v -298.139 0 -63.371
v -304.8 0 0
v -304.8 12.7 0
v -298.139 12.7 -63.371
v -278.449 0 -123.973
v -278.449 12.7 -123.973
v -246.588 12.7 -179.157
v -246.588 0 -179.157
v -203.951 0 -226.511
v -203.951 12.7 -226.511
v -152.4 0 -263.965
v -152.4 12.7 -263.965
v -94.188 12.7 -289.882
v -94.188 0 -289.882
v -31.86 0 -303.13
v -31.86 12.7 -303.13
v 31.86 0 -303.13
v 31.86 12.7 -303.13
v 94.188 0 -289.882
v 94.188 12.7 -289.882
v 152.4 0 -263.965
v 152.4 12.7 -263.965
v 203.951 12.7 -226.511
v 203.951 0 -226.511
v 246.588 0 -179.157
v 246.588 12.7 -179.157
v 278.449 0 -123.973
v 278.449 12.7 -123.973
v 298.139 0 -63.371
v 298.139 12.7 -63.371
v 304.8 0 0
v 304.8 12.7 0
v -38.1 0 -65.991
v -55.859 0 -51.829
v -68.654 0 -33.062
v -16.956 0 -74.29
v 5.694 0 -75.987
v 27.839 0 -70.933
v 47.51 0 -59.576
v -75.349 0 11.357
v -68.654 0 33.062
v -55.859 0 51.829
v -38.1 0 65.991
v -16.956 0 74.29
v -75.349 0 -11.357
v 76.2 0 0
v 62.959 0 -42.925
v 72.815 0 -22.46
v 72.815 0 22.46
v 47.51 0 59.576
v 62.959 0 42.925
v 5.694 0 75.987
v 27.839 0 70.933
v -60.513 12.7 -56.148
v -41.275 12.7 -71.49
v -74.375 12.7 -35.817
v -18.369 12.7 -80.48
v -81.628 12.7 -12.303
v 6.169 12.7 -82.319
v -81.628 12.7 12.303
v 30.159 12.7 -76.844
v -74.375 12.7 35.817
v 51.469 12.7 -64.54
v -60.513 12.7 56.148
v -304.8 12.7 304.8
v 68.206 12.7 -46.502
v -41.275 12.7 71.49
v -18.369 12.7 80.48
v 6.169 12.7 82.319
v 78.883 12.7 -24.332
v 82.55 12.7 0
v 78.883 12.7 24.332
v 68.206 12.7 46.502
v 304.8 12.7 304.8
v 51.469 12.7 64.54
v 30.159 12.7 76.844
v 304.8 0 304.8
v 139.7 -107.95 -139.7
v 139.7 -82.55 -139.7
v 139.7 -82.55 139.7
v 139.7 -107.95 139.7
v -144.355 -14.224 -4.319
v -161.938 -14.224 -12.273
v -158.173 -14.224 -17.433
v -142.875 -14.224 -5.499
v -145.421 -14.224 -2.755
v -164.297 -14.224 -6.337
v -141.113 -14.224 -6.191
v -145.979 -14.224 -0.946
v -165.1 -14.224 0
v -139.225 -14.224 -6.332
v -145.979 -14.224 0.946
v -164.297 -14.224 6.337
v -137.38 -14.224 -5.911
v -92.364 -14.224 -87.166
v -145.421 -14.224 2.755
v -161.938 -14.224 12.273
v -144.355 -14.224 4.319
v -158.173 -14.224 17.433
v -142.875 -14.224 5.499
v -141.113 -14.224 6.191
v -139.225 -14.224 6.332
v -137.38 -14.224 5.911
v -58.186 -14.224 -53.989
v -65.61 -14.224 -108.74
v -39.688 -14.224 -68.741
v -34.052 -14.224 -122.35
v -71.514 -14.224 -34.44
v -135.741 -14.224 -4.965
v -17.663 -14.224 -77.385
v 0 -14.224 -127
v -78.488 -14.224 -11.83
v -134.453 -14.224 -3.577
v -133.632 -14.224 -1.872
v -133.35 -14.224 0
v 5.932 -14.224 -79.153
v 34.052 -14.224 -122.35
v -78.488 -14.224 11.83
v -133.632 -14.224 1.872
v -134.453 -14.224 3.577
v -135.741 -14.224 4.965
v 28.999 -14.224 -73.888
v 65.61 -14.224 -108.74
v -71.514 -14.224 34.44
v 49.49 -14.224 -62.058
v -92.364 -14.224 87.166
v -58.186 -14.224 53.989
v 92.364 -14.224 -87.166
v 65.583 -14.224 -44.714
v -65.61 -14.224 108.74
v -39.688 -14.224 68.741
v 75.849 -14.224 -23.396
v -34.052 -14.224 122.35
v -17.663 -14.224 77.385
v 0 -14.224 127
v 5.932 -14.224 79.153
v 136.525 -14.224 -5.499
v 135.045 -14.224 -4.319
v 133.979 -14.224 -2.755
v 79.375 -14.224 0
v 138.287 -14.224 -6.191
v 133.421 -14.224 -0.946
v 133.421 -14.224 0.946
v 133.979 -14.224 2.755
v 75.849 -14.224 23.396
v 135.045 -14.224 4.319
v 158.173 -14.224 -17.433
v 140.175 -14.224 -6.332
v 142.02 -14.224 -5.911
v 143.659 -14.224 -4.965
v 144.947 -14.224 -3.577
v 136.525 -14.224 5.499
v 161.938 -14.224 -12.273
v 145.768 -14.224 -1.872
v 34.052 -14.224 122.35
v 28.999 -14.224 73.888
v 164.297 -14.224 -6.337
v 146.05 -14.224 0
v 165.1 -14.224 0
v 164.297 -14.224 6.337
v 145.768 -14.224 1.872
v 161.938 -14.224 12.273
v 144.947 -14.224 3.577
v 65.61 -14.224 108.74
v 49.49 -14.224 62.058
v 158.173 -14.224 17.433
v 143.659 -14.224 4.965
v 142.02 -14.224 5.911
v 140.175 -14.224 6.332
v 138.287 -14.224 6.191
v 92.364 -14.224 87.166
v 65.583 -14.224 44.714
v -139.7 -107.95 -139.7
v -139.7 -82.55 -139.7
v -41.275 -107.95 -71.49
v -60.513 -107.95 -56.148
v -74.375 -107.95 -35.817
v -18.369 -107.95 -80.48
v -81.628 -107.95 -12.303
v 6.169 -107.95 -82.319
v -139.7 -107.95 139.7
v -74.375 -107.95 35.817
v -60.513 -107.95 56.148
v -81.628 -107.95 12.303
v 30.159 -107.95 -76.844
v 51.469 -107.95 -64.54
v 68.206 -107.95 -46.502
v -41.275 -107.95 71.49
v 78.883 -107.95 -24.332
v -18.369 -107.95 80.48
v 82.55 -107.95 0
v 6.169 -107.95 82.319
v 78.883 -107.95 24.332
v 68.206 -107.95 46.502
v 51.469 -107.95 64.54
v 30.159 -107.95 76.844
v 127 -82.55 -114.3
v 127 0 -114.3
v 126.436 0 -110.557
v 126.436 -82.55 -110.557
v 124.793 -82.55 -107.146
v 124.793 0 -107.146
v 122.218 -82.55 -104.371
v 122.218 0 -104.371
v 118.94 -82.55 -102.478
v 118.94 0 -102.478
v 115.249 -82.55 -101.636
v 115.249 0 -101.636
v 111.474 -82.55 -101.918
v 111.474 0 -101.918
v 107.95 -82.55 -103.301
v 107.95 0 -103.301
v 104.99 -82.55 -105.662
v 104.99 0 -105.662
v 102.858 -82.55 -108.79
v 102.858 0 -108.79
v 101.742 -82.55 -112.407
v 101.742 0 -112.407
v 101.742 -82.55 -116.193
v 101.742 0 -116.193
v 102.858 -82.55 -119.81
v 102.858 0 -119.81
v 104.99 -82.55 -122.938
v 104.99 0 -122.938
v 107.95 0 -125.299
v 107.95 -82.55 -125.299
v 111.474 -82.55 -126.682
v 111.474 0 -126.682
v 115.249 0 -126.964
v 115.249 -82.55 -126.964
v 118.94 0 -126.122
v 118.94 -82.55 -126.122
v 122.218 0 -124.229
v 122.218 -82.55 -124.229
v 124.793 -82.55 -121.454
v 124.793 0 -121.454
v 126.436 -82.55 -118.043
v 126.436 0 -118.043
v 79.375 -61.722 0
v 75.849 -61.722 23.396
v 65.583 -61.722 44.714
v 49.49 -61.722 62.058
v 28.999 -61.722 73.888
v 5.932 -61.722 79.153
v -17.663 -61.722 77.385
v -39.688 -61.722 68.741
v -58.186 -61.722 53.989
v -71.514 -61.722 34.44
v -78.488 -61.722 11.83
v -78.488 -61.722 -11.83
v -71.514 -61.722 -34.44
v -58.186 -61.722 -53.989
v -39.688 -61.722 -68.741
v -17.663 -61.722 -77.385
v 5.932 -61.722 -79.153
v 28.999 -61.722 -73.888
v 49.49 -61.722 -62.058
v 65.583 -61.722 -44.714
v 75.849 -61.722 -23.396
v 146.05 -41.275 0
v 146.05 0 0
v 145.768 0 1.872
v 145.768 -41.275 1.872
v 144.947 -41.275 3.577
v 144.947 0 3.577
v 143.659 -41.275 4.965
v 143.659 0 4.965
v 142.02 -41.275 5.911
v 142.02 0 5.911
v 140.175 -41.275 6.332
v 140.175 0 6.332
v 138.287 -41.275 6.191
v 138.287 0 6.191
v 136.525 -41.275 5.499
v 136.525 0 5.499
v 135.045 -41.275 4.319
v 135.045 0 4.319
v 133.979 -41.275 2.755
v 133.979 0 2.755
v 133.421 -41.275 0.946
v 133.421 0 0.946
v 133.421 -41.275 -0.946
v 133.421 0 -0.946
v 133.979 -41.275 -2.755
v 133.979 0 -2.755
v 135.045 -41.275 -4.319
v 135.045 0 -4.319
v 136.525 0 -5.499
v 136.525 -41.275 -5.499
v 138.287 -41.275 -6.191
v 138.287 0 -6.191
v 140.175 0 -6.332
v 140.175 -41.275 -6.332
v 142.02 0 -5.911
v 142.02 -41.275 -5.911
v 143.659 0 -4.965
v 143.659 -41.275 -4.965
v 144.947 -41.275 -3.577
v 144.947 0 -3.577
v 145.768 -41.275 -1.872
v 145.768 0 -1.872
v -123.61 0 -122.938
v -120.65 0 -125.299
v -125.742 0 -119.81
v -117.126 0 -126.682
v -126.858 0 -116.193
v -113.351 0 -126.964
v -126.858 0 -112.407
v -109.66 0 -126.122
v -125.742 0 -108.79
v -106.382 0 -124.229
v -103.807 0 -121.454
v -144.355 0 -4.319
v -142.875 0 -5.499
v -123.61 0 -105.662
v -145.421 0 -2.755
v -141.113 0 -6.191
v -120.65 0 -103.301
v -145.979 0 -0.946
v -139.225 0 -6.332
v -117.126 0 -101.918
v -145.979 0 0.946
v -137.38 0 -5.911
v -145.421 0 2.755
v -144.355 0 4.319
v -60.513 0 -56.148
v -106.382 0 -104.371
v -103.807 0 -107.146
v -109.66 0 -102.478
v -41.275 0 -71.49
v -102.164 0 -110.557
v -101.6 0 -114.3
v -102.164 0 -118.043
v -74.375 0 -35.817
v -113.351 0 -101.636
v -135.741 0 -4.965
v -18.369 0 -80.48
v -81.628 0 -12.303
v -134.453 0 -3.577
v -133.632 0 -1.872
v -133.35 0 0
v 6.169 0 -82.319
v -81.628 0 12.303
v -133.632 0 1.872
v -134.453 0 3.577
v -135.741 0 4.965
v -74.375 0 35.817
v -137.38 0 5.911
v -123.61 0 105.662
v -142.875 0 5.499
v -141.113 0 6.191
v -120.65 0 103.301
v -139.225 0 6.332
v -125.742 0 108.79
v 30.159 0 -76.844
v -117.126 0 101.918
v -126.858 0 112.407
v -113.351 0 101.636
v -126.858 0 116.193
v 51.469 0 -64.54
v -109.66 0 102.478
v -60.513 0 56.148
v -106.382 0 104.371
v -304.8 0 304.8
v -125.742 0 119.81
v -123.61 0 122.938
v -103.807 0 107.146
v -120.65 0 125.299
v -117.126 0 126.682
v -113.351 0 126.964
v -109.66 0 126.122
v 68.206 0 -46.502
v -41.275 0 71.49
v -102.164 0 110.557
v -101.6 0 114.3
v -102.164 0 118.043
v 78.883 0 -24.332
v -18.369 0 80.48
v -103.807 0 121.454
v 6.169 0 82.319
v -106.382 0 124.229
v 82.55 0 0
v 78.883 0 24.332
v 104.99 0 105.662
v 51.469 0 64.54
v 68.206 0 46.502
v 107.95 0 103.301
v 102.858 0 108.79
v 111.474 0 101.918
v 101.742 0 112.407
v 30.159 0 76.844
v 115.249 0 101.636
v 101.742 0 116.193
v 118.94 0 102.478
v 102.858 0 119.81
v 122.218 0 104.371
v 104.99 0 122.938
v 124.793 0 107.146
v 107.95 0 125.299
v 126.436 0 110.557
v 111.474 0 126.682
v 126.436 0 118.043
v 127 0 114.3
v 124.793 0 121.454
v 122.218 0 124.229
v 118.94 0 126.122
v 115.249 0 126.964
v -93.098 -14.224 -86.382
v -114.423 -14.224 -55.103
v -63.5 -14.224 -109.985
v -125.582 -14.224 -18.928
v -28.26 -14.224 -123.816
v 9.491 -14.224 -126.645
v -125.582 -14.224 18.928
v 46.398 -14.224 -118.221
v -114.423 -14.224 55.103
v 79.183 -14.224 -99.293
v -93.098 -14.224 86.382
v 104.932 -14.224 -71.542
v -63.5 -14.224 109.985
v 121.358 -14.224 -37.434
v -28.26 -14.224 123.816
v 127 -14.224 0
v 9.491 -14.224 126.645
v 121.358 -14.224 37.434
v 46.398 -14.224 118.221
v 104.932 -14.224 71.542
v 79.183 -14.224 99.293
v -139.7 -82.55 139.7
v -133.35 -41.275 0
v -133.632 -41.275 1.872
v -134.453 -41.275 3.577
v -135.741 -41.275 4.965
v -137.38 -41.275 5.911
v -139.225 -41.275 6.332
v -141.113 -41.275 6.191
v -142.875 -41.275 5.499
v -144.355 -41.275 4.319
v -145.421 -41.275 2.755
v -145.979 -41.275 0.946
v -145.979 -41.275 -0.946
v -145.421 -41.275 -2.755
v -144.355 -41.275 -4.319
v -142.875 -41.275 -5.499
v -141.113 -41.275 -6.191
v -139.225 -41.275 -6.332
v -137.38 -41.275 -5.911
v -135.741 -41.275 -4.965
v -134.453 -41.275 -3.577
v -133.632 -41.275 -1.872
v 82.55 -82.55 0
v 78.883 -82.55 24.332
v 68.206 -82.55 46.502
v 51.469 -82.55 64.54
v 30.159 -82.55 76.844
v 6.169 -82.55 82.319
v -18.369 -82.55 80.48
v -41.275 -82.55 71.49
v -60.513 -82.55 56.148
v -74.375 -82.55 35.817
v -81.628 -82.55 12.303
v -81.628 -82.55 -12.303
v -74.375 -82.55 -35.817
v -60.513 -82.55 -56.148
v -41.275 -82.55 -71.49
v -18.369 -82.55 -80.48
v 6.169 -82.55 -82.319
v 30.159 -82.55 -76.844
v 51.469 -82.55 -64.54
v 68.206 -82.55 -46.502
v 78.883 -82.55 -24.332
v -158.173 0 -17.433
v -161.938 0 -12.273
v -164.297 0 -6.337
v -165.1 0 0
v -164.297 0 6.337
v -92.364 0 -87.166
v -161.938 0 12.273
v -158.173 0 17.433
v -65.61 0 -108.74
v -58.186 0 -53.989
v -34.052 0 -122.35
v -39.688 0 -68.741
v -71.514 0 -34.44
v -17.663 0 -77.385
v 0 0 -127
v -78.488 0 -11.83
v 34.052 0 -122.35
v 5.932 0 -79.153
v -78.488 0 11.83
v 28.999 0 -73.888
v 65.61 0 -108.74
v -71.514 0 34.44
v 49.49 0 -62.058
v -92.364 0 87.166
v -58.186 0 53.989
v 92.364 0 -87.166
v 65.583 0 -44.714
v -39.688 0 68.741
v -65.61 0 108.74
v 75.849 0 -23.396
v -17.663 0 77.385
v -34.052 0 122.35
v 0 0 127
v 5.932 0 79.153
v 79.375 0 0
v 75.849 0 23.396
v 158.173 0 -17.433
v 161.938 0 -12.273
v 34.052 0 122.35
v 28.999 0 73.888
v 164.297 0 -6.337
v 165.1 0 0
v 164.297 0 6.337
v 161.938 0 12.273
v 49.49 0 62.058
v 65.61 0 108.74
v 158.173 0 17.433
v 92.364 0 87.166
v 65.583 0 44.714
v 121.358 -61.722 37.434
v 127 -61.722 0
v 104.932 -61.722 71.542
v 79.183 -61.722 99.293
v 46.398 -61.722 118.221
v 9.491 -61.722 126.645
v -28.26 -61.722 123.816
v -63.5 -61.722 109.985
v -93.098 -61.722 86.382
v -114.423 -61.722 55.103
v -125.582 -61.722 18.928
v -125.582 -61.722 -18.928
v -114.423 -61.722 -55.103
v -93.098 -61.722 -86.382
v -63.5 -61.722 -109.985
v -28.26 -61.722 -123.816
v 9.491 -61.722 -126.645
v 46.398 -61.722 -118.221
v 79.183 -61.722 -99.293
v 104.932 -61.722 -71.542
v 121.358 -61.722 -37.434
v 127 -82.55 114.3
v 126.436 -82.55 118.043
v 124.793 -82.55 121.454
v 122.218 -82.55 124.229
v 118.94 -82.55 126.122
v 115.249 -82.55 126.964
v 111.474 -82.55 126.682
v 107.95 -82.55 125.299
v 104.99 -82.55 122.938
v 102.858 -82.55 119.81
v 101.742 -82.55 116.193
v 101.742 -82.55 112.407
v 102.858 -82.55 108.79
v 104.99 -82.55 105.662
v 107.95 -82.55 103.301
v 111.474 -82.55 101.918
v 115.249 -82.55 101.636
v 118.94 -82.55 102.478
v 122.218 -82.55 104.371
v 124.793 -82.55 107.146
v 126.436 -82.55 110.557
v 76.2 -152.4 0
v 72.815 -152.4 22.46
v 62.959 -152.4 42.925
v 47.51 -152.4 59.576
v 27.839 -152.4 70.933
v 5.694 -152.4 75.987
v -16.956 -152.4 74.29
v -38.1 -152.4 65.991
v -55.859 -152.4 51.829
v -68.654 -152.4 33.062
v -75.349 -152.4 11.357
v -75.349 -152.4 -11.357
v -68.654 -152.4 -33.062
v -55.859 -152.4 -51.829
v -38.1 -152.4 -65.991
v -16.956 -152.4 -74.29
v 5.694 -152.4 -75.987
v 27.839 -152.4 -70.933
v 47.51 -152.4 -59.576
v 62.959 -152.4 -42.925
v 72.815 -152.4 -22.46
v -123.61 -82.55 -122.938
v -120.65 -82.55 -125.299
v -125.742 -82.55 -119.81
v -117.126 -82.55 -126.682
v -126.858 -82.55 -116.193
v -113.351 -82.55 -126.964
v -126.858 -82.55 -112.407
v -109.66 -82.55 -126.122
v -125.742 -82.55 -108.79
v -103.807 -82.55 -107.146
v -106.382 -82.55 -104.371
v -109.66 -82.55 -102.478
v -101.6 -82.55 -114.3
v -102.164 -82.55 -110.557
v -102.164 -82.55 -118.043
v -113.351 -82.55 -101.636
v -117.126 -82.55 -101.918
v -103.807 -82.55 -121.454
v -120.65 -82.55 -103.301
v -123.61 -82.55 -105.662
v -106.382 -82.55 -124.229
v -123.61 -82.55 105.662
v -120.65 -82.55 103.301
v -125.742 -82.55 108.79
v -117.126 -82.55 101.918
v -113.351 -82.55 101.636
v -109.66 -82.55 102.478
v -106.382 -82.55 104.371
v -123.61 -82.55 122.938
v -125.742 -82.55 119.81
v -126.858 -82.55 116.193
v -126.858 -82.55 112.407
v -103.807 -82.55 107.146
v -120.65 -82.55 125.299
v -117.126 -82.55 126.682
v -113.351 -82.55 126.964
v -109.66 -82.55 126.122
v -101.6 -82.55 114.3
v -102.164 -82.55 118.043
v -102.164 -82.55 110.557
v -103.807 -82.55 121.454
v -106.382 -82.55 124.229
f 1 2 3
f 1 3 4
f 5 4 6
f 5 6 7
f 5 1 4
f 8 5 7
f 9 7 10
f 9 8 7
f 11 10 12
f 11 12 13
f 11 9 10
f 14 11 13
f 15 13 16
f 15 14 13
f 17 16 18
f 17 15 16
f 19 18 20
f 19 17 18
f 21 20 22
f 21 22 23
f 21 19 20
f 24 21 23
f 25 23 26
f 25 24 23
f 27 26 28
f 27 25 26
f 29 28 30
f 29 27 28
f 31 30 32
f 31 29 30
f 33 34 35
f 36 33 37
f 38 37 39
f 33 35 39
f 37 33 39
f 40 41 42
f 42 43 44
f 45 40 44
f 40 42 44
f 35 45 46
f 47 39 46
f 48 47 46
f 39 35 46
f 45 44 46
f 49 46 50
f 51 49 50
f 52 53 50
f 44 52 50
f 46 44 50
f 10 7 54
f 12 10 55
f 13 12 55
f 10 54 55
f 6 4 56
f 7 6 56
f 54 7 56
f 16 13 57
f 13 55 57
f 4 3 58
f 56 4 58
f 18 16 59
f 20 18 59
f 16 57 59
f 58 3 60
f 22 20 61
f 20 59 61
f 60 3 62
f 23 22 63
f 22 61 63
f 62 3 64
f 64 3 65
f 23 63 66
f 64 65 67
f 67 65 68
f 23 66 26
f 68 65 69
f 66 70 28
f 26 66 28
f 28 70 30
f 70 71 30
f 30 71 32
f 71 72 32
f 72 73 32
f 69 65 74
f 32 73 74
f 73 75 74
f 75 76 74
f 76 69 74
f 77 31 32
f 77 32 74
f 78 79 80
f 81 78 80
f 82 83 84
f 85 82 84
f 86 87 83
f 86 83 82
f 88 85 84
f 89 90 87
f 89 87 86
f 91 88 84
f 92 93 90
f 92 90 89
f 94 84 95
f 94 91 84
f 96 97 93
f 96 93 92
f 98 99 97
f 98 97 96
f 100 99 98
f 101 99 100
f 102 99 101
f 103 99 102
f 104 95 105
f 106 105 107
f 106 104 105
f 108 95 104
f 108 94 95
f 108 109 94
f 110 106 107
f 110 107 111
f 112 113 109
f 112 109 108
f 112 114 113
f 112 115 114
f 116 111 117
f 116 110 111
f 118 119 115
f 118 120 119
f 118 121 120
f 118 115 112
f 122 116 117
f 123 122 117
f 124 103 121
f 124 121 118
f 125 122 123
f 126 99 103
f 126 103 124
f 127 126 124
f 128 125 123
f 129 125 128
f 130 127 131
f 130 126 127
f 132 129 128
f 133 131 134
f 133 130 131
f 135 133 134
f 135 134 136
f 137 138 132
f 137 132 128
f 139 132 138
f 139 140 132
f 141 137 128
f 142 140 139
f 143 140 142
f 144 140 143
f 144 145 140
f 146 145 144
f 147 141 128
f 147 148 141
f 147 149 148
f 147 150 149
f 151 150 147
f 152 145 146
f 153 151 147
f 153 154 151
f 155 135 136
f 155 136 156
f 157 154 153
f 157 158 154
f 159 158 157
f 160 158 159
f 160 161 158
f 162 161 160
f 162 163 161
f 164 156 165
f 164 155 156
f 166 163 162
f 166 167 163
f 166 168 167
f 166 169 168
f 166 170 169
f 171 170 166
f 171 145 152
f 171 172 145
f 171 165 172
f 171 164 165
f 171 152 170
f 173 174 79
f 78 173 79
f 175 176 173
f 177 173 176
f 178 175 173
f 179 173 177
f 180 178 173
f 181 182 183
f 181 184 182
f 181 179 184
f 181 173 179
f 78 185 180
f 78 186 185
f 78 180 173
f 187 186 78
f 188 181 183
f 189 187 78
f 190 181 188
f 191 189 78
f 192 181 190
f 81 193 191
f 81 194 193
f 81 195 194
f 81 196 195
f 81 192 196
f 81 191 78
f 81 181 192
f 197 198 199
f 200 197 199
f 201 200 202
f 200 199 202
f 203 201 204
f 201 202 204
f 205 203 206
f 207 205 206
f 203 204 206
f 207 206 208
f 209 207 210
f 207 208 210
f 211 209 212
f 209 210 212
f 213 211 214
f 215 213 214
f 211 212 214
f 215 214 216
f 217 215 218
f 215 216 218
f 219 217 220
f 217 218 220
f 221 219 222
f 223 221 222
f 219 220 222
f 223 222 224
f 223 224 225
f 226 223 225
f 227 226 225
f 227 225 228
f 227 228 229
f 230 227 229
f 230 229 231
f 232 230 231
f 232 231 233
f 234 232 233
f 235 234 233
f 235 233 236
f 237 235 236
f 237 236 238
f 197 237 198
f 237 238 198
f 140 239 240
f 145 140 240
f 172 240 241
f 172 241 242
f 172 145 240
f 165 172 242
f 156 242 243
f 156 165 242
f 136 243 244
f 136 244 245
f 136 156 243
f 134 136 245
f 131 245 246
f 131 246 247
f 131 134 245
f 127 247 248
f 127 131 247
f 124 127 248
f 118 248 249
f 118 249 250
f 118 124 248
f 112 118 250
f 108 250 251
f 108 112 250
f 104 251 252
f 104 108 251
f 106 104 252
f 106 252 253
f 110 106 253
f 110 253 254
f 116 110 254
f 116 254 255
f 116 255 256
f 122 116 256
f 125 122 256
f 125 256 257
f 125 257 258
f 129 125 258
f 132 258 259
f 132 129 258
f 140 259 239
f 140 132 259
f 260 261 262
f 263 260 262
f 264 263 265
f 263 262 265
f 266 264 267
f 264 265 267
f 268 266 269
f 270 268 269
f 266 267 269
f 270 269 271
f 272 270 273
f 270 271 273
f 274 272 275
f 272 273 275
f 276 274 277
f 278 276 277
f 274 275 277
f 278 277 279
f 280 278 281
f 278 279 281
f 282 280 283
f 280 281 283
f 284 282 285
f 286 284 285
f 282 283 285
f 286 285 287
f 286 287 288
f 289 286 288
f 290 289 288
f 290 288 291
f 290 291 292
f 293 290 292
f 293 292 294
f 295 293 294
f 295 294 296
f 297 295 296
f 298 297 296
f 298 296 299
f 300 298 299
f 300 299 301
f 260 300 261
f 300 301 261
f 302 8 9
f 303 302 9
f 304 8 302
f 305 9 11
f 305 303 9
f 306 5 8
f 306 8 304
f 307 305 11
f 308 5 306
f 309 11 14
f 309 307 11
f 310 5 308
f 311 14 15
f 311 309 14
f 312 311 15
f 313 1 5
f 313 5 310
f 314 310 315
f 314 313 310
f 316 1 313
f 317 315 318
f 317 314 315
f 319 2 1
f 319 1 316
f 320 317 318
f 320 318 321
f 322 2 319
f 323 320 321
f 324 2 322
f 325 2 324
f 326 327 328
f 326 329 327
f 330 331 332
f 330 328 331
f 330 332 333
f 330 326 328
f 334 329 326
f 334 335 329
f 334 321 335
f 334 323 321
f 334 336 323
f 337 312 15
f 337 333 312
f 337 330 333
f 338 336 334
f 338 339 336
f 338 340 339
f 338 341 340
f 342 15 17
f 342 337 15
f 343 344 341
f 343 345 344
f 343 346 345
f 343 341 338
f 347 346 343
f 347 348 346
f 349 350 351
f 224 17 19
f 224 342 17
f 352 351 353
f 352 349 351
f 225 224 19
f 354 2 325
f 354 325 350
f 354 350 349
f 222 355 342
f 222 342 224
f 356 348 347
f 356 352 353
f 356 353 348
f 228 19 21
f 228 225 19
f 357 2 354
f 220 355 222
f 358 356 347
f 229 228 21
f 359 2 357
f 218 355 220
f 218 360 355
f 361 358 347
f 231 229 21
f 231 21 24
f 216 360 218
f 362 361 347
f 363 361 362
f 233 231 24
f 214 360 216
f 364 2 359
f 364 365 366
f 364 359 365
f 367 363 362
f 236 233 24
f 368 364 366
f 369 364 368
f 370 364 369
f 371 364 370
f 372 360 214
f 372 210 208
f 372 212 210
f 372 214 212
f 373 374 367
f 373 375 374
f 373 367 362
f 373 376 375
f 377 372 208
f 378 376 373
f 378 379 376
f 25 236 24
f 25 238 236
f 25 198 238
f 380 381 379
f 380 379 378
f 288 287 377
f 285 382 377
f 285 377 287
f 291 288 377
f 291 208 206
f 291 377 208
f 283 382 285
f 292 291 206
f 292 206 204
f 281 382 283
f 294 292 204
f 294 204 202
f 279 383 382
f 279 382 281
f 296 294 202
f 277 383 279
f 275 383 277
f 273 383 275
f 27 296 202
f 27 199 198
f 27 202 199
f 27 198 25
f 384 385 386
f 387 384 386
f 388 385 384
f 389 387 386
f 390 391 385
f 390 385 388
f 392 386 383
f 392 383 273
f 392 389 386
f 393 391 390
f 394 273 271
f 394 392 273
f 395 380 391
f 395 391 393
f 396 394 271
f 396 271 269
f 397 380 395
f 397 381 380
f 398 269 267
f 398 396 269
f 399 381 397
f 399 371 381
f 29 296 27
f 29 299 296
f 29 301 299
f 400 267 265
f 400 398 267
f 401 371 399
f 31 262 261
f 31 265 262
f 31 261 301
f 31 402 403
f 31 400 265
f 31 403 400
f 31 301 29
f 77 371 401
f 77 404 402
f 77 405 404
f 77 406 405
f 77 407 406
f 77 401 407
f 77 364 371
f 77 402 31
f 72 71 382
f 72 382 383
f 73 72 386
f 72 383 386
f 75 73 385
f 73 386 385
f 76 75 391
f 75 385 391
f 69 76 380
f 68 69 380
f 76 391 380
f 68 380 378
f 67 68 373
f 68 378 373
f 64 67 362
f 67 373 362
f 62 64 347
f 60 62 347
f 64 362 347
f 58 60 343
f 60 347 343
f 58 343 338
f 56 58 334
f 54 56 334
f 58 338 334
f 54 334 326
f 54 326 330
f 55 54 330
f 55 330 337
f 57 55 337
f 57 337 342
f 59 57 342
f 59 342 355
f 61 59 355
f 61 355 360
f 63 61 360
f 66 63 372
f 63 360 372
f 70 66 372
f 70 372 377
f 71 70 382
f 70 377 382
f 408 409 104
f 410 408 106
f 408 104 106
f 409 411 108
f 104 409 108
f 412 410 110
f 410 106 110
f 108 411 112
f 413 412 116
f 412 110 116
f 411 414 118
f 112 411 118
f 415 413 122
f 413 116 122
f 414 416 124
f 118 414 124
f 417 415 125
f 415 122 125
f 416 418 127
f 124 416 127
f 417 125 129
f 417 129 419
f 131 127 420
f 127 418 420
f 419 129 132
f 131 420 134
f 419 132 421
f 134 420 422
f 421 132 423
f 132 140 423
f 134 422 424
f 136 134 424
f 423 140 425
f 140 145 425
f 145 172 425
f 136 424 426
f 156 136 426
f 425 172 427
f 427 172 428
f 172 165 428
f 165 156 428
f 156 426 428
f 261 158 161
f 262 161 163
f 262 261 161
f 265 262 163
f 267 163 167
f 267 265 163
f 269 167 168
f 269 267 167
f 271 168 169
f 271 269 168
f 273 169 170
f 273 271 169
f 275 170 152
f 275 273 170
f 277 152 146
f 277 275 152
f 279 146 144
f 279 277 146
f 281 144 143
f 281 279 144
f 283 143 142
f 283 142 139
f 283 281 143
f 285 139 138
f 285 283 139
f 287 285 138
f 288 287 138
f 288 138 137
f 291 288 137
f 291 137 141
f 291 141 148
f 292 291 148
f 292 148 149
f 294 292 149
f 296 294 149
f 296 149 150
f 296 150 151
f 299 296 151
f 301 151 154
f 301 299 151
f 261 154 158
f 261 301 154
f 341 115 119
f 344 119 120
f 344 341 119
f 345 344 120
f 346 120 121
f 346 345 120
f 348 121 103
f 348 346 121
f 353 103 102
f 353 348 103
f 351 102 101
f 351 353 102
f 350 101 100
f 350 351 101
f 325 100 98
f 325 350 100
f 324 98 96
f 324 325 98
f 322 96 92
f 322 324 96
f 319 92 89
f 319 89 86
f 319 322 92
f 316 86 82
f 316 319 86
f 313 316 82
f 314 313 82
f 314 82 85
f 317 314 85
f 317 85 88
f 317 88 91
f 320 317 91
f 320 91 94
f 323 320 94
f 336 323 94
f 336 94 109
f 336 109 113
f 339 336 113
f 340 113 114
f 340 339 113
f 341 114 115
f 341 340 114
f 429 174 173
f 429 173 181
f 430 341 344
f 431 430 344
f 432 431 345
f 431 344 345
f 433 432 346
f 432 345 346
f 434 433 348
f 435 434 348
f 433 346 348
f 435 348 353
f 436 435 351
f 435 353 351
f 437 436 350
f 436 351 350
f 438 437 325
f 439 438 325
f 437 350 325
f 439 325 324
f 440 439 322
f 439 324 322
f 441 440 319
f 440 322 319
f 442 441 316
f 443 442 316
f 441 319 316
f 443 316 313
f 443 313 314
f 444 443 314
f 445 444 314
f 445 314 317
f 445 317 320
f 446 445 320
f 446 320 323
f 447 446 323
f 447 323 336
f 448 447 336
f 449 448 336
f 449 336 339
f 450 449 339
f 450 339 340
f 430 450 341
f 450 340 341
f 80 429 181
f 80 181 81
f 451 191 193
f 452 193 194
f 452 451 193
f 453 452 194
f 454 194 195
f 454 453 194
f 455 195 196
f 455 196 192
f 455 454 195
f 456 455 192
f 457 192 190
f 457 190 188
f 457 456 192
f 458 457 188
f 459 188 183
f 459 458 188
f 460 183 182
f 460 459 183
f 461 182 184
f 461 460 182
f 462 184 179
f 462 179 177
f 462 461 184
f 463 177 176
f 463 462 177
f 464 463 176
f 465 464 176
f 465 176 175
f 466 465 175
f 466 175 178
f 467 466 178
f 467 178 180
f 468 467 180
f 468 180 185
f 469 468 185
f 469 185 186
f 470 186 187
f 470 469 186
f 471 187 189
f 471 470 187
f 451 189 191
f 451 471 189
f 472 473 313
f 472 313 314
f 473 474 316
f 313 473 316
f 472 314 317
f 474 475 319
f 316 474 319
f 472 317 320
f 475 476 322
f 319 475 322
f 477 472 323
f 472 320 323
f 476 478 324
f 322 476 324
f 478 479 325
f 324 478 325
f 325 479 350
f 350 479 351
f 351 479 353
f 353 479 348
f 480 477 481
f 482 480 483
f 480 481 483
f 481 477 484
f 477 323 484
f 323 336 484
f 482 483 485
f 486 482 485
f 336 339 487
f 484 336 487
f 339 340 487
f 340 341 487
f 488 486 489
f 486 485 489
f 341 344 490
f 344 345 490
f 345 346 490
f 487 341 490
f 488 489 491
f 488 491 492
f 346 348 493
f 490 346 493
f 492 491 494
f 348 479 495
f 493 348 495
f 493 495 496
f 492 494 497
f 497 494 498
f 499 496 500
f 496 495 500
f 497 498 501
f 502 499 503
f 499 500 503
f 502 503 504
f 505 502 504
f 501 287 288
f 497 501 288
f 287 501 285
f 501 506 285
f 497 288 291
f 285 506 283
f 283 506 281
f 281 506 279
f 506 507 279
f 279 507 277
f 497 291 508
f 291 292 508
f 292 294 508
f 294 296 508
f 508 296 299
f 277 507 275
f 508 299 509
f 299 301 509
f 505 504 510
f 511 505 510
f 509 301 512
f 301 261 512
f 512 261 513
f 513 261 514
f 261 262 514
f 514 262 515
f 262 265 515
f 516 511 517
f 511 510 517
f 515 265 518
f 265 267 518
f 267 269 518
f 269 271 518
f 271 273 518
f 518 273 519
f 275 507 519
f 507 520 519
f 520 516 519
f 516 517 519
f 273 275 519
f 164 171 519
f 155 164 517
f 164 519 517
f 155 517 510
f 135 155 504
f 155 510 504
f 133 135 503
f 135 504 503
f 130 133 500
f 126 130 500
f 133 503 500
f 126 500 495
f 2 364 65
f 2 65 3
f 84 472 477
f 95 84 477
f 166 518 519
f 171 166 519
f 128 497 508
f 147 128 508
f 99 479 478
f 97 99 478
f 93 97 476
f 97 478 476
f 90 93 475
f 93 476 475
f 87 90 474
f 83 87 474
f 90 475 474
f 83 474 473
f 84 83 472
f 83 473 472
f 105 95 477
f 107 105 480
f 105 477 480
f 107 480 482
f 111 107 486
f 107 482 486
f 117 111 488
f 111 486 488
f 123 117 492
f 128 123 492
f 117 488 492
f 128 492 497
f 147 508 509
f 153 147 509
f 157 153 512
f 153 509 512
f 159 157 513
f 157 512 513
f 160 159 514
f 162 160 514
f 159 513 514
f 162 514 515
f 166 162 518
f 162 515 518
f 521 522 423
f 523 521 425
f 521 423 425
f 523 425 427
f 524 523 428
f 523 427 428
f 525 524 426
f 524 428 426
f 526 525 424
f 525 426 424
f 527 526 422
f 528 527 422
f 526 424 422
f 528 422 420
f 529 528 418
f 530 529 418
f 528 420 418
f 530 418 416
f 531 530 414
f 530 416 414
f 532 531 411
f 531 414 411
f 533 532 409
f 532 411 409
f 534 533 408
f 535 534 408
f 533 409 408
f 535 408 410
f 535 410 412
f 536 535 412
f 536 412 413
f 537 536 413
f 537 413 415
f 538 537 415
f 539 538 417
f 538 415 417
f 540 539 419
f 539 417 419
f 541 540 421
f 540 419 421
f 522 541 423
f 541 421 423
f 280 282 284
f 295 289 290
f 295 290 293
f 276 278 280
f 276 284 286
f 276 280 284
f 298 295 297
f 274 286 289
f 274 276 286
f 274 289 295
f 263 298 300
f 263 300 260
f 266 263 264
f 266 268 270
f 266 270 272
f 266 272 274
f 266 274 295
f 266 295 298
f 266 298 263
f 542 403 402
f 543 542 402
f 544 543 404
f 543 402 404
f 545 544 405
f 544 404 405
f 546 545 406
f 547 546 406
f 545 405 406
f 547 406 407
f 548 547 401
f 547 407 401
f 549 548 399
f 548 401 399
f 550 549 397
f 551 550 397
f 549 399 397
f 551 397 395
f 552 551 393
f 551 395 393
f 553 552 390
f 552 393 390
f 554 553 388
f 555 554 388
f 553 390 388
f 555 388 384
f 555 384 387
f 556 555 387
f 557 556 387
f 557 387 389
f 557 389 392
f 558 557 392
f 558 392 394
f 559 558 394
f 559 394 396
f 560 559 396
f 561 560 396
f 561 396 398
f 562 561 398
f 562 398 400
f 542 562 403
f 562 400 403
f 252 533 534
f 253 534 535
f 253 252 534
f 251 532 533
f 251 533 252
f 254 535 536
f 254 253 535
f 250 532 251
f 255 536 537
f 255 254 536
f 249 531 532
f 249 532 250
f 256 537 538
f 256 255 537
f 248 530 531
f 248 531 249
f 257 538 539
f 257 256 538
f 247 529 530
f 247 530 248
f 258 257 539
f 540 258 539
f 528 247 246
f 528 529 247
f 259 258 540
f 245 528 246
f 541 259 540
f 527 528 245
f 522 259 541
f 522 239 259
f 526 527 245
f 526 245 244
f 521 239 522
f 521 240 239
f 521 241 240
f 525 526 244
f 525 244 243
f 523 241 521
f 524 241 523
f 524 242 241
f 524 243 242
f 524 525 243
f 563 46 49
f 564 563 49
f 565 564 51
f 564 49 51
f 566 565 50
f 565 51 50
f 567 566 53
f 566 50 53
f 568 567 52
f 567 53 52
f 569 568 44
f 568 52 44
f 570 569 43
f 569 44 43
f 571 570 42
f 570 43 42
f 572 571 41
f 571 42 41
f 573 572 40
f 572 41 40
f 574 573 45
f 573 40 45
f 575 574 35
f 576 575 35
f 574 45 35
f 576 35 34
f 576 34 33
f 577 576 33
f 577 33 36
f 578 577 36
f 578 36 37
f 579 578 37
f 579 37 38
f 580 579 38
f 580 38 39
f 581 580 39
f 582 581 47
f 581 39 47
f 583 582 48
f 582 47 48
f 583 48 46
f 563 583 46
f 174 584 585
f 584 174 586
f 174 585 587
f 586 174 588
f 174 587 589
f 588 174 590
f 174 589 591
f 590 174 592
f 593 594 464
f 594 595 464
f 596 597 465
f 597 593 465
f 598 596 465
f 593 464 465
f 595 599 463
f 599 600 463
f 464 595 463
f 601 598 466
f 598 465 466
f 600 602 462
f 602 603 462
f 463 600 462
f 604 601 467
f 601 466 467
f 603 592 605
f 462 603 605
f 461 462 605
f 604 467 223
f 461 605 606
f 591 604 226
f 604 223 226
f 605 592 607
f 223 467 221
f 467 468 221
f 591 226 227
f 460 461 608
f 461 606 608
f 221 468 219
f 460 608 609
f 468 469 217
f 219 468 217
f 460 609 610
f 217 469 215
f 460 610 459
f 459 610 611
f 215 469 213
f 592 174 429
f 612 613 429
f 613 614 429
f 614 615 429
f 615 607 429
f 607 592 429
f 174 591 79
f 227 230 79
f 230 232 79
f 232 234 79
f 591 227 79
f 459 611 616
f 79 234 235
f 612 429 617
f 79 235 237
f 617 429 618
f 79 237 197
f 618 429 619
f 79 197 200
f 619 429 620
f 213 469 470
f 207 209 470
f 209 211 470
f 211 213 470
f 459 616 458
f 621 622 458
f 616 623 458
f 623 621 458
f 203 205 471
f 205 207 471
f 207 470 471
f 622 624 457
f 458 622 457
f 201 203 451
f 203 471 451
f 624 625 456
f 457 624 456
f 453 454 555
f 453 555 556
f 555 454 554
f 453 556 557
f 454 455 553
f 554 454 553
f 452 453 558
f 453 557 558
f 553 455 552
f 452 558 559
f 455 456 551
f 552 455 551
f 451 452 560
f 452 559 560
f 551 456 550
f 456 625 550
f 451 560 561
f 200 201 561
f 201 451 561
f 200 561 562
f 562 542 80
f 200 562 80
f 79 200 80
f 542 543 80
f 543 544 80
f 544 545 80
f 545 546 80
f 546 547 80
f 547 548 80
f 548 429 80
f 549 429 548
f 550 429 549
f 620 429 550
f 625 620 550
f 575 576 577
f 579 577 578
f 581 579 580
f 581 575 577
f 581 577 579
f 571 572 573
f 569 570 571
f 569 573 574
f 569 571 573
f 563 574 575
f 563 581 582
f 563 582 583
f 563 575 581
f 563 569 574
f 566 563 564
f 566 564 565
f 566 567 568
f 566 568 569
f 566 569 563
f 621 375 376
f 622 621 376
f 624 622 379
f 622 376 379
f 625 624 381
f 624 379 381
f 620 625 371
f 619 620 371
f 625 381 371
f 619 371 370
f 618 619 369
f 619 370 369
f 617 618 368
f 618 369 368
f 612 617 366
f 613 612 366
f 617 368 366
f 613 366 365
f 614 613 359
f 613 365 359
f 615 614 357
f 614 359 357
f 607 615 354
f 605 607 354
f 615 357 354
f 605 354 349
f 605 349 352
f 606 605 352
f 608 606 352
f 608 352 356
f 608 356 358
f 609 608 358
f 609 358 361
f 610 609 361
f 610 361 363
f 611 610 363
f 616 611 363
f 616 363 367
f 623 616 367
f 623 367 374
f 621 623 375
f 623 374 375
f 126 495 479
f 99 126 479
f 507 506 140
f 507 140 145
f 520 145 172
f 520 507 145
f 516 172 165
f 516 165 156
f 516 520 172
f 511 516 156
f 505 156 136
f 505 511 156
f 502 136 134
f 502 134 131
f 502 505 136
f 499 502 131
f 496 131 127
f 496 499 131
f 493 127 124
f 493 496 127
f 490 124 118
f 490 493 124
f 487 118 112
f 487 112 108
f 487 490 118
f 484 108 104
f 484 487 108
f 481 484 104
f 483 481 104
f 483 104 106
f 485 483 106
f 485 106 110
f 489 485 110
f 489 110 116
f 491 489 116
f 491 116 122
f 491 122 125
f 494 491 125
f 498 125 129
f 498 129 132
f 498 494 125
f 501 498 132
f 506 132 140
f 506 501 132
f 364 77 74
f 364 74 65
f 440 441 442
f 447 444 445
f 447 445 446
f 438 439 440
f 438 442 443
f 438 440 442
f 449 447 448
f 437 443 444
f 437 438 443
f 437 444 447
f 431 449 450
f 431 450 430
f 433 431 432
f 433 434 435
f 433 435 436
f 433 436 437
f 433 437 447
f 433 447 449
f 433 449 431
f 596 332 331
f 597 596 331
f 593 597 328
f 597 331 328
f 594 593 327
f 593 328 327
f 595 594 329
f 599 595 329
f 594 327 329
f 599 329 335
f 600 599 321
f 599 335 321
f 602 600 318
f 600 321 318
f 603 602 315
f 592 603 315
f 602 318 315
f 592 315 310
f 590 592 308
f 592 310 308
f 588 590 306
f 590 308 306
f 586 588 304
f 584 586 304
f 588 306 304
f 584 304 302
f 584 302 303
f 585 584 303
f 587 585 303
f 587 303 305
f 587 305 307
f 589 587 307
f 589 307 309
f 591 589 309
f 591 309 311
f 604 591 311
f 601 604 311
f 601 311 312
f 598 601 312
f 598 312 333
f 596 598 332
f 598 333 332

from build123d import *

# Parameters (mm, degrees)
F0_R      = 82.55
F1_DEPTH  = 12.7
F2_R      = 76.2
F3_DEPTH  = 152.4
F2_R_2    = 6.35
F4_DEPTH  = 41.275
F2_R_3    = 12.7
F5_DEPTH  = 82.55
F6_DEPTH  = 82.55
F7_W      = 279.4
F7_H      = 279.4
F7_R      = 12.7
F7_R_2    = 82.55
F8_DEPTH  = 25.4
F9_R      = 6.35
F9_R_2    = 82.55
F9_R_3    = 79.375
F10_DEPTH = 14.224
F12_R     = 127
F12_R_2   = 79.375
F13_DEPTH = 47.498


with BuildPart() as f1:
    # F0 (on Front) → F1 (new body)
    with BuildSketch(Plane.XZ):
        with BuildLine():
            Line((-304.8, 304.8), (-304.8, 0))
            ThreePointArc((-304.8, 0), (0, -304.8), (304.8, 0))
            Line((304.8, 0), (304.8, 304.8))
            Line((304.8, 304.8), (-304.8, 304.8))
        make_face()
        Circle(F0_R, mode=Mode.SUBTRACT)
    extrude(amount=-F1_DEPTH)

    # F2 (on Front) → F4 (join)
    with BuildSketch(Plane.XZ):
        with Locations((-139.7, 0)):
            Circle(F2_R_2)
        with Locations((139.7, 0)):
            Circle(F2_R_2)
    extrude(amount=F4_DEPTH)

    # F2 (on Front) → F5 (join)
    with BuildSketch(Plane.XZ):
        with Locations((114.3, 114.3)):
            Circle(F2_R_3)
    extrude(amount=F5_DEPTH)

    # F2 (on Front) → F6 (join)
    with BuildSketch(Plane.XZ):
        with Locations((-114.3, 114.3)):
            Circle(F2_R_3)
        with Locations((114.3, -114.3)):
            Circle(F2_R_3)
        with Locations((-114.3, -114.3)):
            Circle(F2_R_3)
    extrude(amount=F6_DEPTH)

    # F7 (on face) → F8 (join)
    with BuildSketch(Plane.XZ.offset(82.55)):
        Rectangle(F7_W, F7_H)
        with Locations((-114.3, 114.3)):
            Circle(F7_R, mode=Mode.SUBTRACT)
        Circle(F7_R_2, mode=Mode.SUBTRACT)
        with Locations((-114.3, 114.3)):
            Circle(F7_R)
    extrude(amount=F8_DEPTH)


with BuildPart() as f3:
    # F2 (on Front) → F3 (new body)
    with BuildSketch(Plane.XZ):
        Circle(F2_R)
    extrude(amount=F3_DEPTH)


with BuildPart() as f10:
    # F9 (on face) → F10 (new body)
    with BuildSketch(Plane.XZ):
        with BuildLine():
            Line((-92.363636, 87.16627), (-158.172727, 17.433254))
            ThreePointArc((-158.172727, 17.433254), (-165.1, 0), (-158.172727, -17.433254))
            Line((-158.172727, -17.433254), (-92.363636, -87.16627))
            ThreePointArc((-92.363636, -87.16627), (0, -127), (92.363636, -87.16627))
            Line((92.363636, -87.16627), (158.172727, -17.433254))
            ThreePointArc((158.172727, -17.433254), (165.1, 0), (158.172727, 17.433254))
            Line((158.172727, 17.433254), (92.363636, 87.16627))
            ThreePointArc((92.363636, 87.16627), (0, 127), (-92.363636, 87.16627))
        make_face()
        with Locations((-139.7, 0)):
            Circle(F9_R, mode=Mode.SUBTRACT)
        Circle(F9_R_2, mode=Mode.SUBTRACT)
        with Locations((139.7, 0)):
            Circle(F9_R, mode=Mode.SUBTRACT)
        Circle(F9_R_2)
        Circle(F9_R_3, mode=Mode.SUBTRACT)
    extrude(amount=F10_DEPTH)


with BuildPart() as f13:
    # F12 (on offset) → F13 (new body)
    with BuildSketch(Plane.XZ.offset(14.224)):
        Circle(F12_R)
        Circle(F12_R_2, mode=Mode.SUBTRACT)
    extrude(amount=F13_DEPTH)


solid = Compound([f1.part, f3.part, f10.part, f13.part])
